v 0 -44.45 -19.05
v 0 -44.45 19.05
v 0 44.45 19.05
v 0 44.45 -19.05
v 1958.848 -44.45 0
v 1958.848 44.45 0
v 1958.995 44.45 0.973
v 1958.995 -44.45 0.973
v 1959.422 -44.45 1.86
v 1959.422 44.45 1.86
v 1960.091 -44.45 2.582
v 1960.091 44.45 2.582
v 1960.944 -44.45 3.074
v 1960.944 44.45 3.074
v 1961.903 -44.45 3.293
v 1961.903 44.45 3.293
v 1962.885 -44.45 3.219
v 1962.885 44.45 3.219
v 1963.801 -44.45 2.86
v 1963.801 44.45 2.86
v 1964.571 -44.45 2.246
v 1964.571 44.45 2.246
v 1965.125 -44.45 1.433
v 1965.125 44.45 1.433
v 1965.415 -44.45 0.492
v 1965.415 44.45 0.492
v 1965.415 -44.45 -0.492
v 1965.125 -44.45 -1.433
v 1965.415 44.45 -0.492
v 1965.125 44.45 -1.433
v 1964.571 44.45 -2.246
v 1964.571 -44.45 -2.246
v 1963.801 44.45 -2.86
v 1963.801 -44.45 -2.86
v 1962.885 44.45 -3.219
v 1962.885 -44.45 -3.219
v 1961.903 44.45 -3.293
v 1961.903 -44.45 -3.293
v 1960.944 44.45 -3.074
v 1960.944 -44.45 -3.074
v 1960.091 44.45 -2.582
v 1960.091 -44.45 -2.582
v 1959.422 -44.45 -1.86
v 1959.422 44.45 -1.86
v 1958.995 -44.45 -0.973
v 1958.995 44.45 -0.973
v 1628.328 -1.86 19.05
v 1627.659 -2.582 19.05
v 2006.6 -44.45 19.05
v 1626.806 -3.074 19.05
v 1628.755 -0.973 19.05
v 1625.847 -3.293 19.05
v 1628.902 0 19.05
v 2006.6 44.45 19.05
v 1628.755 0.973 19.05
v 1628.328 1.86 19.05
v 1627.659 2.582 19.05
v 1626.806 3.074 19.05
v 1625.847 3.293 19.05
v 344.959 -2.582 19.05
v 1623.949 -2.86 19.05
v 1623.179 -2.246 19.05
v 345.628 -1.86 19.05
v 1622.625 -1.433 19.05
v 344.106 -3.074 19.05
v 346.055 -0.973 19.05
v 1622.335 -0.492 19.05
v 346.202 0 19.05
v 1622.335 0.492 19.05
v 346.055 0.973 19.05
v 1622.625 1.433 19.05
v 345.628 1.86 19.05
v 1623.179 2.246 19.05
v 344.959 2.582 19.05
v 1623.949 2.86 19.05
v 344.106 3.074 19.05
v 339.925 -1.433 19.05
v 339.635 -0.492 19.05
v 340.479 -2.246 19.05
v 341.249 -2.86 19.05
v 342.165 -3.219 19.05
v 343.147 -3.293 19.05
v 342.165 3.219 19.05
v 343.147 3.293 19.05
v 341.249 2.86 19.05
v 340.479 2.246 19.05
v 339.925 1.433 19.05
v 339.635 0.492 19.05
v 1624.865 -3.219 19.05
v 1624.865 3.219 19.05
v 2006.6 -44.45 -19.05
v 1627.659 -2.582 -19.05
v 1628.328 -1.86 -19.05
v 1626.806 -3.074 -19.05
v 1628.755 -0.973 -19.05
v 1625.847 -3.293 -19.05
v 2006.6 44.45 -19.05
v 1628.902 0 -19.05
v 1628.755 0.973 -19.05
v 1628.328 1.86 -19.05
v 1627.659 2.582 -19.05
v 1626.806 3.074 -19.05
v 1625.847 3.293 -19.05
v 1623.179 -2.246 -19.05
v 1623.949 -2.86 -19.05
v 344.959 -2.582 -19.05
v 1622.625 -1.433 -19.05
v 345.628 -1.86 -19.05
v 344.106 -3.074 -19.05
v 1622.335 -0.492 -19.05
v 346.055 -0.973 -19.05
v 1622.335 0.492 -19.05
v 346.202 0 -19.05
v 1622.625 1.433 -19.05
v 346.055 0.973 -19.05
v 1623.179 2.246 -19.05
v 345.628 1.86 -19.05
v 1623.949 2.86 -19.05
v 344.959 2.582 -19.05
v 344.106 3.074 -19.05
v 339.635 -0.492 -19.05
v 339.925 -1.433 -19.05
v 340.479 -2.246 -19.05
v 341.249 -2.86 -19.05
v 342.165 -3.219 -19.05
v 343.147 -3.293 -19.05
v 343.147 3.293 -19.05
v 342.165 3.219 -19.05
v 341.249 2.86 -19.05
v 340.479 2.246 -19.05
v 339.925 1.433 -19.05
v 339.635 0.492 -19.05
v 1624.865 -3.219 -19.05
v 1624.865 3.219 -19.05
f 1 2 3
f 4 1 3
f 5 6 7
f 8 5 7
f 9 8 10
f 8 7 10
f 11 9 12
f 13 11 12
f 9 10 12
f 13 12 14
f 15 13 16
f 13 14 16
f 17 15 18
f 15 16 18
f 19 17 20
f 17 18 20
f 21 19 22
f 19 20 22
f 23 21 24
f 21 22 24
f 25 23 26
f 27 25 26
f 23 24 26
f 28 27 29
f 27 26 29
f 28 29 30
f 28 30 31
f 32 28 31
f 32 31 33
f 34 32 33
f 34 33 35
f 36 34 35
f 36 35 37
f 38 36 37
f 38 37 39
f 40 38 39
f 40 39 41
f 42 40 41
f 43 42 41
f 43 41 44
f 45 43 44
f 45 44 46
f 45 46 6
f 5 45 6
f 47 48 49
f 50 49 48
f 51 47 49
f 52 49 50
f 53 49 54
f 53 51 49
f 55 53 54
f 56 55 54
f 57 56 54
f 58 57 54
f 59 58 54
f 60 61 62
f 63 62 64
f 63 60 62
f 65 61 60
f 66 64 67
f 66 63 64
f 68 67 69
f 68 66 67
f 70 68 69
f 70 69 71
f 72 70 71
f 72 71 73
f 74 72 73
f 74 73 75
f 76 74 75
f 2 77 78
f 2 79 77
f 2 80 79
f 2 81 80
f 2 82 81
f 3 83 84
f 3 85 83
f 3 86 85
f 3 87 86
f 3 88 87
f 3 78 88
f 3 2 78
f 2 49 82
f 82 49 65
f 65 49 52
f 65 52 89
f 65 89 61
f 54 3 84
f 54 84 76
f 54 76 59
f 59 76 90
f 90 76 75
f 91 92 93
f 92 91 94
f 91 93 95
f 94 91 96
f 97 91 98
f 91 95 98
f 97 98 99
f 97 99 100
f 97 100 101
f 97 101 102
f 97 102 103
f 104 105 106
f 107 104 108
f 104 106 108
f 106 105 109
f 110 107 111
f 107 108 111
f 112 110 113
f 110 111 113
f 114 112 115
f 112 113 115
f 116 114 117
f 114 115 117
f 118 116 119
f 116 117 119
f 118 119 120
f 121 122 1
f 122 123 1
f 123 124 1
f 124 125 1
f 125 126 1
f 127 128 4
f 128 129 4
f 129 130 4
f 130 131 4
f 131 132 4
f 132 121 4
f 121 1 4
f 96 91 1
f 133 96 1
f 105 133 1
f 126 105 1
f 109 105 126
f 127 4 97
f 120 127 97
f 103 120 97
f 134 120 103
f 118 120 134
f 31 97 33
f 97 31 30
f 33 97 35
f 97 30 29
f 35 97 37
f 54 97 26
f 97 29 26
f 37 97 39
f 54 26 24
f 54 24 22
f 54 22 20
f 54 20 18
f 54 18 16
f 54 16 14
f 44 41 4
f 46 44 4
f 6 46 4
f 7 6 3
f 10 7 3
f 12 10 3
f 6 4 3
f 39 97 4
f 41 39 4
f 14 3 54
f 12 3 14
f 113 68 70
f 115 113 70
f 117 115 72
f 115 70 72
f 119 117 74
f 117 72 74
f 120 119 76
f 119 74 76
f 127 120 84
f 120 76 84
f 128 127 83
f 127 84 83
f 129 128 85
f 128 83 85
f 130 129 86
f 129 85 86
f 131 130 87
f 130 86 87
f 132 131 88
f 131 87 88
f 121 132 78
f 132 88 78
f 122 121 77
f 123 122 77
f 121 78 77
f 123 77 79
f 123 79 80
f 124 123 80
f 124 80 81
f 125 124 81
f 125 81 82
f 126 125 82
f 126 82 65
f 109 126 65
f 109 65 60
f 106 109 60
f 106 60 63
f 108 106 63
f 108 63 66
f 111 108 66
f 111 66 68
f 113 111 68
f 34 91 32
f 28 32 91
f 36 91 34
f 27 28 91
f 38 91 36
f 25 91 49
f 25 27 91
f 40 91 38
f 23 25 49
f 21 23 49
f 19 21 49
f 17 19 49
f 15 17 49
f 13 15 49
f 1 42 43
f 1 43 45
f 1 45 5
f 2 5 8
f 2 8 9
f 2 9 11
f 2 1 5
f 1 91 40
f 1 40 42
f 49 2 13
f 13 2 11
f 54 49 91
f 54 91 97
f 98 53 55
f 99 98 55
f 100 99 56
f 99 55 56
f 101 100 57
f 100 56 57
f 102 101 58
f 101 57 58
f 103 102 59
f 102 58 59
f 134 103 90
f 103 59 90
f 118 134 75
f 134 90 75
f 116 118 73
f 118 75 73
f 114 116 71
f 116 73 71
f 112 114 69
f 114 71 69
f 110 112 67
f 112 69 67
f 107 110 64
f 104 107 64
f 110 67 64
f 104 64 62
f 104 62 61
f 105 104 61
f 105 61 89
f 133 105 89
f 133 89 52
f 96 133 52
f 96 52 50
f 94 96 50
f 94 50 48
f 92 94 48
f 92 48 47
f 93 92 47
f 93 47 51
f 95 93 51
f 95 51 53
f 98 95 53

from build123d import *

# Parameters (mm, degrees)
F0_W     = 88.9
F0_H     = 38.1
F1_DEPTH = 2006.6
F2_R     = 3.302
F3_DEPTH = 38.101
F4_R     = 3.302
F5_DEPTH = 88.901


with BuildPart() as f1:
    # F0 (on Right) → F1 (new body)
    with BuildSketch(Plane.YZ):
        Rectangle(F0_W, F0_H)
    extrude(amount=F1_DEPTH)

    # F2 (on face) → F3 (cut, through all)
    with BuildSketch(Plane.XY.offset(19.05)):
        with Locations((342.9, 0)):
            Circle(F2_R)
        with Locations((1625.6, 0)):
            Circle(F2_R)
    extrude(amount=-F3_DEPTH, mode=Mode.SUBTRACT)

    # F4 (on face) → F5 (cut, through all)
    with BuildSketch(Plane(origin=(0, 44.45, 0), x_dir=(-1, 0, 0), z_dir=(0, 1, 0))):
        with Locations((-1962.15, 0)):
            Circle(F4_R)
    extrude(amount=-F5_DEPTH, mode=Mode.SUBTRACT)


solid = f1.part
